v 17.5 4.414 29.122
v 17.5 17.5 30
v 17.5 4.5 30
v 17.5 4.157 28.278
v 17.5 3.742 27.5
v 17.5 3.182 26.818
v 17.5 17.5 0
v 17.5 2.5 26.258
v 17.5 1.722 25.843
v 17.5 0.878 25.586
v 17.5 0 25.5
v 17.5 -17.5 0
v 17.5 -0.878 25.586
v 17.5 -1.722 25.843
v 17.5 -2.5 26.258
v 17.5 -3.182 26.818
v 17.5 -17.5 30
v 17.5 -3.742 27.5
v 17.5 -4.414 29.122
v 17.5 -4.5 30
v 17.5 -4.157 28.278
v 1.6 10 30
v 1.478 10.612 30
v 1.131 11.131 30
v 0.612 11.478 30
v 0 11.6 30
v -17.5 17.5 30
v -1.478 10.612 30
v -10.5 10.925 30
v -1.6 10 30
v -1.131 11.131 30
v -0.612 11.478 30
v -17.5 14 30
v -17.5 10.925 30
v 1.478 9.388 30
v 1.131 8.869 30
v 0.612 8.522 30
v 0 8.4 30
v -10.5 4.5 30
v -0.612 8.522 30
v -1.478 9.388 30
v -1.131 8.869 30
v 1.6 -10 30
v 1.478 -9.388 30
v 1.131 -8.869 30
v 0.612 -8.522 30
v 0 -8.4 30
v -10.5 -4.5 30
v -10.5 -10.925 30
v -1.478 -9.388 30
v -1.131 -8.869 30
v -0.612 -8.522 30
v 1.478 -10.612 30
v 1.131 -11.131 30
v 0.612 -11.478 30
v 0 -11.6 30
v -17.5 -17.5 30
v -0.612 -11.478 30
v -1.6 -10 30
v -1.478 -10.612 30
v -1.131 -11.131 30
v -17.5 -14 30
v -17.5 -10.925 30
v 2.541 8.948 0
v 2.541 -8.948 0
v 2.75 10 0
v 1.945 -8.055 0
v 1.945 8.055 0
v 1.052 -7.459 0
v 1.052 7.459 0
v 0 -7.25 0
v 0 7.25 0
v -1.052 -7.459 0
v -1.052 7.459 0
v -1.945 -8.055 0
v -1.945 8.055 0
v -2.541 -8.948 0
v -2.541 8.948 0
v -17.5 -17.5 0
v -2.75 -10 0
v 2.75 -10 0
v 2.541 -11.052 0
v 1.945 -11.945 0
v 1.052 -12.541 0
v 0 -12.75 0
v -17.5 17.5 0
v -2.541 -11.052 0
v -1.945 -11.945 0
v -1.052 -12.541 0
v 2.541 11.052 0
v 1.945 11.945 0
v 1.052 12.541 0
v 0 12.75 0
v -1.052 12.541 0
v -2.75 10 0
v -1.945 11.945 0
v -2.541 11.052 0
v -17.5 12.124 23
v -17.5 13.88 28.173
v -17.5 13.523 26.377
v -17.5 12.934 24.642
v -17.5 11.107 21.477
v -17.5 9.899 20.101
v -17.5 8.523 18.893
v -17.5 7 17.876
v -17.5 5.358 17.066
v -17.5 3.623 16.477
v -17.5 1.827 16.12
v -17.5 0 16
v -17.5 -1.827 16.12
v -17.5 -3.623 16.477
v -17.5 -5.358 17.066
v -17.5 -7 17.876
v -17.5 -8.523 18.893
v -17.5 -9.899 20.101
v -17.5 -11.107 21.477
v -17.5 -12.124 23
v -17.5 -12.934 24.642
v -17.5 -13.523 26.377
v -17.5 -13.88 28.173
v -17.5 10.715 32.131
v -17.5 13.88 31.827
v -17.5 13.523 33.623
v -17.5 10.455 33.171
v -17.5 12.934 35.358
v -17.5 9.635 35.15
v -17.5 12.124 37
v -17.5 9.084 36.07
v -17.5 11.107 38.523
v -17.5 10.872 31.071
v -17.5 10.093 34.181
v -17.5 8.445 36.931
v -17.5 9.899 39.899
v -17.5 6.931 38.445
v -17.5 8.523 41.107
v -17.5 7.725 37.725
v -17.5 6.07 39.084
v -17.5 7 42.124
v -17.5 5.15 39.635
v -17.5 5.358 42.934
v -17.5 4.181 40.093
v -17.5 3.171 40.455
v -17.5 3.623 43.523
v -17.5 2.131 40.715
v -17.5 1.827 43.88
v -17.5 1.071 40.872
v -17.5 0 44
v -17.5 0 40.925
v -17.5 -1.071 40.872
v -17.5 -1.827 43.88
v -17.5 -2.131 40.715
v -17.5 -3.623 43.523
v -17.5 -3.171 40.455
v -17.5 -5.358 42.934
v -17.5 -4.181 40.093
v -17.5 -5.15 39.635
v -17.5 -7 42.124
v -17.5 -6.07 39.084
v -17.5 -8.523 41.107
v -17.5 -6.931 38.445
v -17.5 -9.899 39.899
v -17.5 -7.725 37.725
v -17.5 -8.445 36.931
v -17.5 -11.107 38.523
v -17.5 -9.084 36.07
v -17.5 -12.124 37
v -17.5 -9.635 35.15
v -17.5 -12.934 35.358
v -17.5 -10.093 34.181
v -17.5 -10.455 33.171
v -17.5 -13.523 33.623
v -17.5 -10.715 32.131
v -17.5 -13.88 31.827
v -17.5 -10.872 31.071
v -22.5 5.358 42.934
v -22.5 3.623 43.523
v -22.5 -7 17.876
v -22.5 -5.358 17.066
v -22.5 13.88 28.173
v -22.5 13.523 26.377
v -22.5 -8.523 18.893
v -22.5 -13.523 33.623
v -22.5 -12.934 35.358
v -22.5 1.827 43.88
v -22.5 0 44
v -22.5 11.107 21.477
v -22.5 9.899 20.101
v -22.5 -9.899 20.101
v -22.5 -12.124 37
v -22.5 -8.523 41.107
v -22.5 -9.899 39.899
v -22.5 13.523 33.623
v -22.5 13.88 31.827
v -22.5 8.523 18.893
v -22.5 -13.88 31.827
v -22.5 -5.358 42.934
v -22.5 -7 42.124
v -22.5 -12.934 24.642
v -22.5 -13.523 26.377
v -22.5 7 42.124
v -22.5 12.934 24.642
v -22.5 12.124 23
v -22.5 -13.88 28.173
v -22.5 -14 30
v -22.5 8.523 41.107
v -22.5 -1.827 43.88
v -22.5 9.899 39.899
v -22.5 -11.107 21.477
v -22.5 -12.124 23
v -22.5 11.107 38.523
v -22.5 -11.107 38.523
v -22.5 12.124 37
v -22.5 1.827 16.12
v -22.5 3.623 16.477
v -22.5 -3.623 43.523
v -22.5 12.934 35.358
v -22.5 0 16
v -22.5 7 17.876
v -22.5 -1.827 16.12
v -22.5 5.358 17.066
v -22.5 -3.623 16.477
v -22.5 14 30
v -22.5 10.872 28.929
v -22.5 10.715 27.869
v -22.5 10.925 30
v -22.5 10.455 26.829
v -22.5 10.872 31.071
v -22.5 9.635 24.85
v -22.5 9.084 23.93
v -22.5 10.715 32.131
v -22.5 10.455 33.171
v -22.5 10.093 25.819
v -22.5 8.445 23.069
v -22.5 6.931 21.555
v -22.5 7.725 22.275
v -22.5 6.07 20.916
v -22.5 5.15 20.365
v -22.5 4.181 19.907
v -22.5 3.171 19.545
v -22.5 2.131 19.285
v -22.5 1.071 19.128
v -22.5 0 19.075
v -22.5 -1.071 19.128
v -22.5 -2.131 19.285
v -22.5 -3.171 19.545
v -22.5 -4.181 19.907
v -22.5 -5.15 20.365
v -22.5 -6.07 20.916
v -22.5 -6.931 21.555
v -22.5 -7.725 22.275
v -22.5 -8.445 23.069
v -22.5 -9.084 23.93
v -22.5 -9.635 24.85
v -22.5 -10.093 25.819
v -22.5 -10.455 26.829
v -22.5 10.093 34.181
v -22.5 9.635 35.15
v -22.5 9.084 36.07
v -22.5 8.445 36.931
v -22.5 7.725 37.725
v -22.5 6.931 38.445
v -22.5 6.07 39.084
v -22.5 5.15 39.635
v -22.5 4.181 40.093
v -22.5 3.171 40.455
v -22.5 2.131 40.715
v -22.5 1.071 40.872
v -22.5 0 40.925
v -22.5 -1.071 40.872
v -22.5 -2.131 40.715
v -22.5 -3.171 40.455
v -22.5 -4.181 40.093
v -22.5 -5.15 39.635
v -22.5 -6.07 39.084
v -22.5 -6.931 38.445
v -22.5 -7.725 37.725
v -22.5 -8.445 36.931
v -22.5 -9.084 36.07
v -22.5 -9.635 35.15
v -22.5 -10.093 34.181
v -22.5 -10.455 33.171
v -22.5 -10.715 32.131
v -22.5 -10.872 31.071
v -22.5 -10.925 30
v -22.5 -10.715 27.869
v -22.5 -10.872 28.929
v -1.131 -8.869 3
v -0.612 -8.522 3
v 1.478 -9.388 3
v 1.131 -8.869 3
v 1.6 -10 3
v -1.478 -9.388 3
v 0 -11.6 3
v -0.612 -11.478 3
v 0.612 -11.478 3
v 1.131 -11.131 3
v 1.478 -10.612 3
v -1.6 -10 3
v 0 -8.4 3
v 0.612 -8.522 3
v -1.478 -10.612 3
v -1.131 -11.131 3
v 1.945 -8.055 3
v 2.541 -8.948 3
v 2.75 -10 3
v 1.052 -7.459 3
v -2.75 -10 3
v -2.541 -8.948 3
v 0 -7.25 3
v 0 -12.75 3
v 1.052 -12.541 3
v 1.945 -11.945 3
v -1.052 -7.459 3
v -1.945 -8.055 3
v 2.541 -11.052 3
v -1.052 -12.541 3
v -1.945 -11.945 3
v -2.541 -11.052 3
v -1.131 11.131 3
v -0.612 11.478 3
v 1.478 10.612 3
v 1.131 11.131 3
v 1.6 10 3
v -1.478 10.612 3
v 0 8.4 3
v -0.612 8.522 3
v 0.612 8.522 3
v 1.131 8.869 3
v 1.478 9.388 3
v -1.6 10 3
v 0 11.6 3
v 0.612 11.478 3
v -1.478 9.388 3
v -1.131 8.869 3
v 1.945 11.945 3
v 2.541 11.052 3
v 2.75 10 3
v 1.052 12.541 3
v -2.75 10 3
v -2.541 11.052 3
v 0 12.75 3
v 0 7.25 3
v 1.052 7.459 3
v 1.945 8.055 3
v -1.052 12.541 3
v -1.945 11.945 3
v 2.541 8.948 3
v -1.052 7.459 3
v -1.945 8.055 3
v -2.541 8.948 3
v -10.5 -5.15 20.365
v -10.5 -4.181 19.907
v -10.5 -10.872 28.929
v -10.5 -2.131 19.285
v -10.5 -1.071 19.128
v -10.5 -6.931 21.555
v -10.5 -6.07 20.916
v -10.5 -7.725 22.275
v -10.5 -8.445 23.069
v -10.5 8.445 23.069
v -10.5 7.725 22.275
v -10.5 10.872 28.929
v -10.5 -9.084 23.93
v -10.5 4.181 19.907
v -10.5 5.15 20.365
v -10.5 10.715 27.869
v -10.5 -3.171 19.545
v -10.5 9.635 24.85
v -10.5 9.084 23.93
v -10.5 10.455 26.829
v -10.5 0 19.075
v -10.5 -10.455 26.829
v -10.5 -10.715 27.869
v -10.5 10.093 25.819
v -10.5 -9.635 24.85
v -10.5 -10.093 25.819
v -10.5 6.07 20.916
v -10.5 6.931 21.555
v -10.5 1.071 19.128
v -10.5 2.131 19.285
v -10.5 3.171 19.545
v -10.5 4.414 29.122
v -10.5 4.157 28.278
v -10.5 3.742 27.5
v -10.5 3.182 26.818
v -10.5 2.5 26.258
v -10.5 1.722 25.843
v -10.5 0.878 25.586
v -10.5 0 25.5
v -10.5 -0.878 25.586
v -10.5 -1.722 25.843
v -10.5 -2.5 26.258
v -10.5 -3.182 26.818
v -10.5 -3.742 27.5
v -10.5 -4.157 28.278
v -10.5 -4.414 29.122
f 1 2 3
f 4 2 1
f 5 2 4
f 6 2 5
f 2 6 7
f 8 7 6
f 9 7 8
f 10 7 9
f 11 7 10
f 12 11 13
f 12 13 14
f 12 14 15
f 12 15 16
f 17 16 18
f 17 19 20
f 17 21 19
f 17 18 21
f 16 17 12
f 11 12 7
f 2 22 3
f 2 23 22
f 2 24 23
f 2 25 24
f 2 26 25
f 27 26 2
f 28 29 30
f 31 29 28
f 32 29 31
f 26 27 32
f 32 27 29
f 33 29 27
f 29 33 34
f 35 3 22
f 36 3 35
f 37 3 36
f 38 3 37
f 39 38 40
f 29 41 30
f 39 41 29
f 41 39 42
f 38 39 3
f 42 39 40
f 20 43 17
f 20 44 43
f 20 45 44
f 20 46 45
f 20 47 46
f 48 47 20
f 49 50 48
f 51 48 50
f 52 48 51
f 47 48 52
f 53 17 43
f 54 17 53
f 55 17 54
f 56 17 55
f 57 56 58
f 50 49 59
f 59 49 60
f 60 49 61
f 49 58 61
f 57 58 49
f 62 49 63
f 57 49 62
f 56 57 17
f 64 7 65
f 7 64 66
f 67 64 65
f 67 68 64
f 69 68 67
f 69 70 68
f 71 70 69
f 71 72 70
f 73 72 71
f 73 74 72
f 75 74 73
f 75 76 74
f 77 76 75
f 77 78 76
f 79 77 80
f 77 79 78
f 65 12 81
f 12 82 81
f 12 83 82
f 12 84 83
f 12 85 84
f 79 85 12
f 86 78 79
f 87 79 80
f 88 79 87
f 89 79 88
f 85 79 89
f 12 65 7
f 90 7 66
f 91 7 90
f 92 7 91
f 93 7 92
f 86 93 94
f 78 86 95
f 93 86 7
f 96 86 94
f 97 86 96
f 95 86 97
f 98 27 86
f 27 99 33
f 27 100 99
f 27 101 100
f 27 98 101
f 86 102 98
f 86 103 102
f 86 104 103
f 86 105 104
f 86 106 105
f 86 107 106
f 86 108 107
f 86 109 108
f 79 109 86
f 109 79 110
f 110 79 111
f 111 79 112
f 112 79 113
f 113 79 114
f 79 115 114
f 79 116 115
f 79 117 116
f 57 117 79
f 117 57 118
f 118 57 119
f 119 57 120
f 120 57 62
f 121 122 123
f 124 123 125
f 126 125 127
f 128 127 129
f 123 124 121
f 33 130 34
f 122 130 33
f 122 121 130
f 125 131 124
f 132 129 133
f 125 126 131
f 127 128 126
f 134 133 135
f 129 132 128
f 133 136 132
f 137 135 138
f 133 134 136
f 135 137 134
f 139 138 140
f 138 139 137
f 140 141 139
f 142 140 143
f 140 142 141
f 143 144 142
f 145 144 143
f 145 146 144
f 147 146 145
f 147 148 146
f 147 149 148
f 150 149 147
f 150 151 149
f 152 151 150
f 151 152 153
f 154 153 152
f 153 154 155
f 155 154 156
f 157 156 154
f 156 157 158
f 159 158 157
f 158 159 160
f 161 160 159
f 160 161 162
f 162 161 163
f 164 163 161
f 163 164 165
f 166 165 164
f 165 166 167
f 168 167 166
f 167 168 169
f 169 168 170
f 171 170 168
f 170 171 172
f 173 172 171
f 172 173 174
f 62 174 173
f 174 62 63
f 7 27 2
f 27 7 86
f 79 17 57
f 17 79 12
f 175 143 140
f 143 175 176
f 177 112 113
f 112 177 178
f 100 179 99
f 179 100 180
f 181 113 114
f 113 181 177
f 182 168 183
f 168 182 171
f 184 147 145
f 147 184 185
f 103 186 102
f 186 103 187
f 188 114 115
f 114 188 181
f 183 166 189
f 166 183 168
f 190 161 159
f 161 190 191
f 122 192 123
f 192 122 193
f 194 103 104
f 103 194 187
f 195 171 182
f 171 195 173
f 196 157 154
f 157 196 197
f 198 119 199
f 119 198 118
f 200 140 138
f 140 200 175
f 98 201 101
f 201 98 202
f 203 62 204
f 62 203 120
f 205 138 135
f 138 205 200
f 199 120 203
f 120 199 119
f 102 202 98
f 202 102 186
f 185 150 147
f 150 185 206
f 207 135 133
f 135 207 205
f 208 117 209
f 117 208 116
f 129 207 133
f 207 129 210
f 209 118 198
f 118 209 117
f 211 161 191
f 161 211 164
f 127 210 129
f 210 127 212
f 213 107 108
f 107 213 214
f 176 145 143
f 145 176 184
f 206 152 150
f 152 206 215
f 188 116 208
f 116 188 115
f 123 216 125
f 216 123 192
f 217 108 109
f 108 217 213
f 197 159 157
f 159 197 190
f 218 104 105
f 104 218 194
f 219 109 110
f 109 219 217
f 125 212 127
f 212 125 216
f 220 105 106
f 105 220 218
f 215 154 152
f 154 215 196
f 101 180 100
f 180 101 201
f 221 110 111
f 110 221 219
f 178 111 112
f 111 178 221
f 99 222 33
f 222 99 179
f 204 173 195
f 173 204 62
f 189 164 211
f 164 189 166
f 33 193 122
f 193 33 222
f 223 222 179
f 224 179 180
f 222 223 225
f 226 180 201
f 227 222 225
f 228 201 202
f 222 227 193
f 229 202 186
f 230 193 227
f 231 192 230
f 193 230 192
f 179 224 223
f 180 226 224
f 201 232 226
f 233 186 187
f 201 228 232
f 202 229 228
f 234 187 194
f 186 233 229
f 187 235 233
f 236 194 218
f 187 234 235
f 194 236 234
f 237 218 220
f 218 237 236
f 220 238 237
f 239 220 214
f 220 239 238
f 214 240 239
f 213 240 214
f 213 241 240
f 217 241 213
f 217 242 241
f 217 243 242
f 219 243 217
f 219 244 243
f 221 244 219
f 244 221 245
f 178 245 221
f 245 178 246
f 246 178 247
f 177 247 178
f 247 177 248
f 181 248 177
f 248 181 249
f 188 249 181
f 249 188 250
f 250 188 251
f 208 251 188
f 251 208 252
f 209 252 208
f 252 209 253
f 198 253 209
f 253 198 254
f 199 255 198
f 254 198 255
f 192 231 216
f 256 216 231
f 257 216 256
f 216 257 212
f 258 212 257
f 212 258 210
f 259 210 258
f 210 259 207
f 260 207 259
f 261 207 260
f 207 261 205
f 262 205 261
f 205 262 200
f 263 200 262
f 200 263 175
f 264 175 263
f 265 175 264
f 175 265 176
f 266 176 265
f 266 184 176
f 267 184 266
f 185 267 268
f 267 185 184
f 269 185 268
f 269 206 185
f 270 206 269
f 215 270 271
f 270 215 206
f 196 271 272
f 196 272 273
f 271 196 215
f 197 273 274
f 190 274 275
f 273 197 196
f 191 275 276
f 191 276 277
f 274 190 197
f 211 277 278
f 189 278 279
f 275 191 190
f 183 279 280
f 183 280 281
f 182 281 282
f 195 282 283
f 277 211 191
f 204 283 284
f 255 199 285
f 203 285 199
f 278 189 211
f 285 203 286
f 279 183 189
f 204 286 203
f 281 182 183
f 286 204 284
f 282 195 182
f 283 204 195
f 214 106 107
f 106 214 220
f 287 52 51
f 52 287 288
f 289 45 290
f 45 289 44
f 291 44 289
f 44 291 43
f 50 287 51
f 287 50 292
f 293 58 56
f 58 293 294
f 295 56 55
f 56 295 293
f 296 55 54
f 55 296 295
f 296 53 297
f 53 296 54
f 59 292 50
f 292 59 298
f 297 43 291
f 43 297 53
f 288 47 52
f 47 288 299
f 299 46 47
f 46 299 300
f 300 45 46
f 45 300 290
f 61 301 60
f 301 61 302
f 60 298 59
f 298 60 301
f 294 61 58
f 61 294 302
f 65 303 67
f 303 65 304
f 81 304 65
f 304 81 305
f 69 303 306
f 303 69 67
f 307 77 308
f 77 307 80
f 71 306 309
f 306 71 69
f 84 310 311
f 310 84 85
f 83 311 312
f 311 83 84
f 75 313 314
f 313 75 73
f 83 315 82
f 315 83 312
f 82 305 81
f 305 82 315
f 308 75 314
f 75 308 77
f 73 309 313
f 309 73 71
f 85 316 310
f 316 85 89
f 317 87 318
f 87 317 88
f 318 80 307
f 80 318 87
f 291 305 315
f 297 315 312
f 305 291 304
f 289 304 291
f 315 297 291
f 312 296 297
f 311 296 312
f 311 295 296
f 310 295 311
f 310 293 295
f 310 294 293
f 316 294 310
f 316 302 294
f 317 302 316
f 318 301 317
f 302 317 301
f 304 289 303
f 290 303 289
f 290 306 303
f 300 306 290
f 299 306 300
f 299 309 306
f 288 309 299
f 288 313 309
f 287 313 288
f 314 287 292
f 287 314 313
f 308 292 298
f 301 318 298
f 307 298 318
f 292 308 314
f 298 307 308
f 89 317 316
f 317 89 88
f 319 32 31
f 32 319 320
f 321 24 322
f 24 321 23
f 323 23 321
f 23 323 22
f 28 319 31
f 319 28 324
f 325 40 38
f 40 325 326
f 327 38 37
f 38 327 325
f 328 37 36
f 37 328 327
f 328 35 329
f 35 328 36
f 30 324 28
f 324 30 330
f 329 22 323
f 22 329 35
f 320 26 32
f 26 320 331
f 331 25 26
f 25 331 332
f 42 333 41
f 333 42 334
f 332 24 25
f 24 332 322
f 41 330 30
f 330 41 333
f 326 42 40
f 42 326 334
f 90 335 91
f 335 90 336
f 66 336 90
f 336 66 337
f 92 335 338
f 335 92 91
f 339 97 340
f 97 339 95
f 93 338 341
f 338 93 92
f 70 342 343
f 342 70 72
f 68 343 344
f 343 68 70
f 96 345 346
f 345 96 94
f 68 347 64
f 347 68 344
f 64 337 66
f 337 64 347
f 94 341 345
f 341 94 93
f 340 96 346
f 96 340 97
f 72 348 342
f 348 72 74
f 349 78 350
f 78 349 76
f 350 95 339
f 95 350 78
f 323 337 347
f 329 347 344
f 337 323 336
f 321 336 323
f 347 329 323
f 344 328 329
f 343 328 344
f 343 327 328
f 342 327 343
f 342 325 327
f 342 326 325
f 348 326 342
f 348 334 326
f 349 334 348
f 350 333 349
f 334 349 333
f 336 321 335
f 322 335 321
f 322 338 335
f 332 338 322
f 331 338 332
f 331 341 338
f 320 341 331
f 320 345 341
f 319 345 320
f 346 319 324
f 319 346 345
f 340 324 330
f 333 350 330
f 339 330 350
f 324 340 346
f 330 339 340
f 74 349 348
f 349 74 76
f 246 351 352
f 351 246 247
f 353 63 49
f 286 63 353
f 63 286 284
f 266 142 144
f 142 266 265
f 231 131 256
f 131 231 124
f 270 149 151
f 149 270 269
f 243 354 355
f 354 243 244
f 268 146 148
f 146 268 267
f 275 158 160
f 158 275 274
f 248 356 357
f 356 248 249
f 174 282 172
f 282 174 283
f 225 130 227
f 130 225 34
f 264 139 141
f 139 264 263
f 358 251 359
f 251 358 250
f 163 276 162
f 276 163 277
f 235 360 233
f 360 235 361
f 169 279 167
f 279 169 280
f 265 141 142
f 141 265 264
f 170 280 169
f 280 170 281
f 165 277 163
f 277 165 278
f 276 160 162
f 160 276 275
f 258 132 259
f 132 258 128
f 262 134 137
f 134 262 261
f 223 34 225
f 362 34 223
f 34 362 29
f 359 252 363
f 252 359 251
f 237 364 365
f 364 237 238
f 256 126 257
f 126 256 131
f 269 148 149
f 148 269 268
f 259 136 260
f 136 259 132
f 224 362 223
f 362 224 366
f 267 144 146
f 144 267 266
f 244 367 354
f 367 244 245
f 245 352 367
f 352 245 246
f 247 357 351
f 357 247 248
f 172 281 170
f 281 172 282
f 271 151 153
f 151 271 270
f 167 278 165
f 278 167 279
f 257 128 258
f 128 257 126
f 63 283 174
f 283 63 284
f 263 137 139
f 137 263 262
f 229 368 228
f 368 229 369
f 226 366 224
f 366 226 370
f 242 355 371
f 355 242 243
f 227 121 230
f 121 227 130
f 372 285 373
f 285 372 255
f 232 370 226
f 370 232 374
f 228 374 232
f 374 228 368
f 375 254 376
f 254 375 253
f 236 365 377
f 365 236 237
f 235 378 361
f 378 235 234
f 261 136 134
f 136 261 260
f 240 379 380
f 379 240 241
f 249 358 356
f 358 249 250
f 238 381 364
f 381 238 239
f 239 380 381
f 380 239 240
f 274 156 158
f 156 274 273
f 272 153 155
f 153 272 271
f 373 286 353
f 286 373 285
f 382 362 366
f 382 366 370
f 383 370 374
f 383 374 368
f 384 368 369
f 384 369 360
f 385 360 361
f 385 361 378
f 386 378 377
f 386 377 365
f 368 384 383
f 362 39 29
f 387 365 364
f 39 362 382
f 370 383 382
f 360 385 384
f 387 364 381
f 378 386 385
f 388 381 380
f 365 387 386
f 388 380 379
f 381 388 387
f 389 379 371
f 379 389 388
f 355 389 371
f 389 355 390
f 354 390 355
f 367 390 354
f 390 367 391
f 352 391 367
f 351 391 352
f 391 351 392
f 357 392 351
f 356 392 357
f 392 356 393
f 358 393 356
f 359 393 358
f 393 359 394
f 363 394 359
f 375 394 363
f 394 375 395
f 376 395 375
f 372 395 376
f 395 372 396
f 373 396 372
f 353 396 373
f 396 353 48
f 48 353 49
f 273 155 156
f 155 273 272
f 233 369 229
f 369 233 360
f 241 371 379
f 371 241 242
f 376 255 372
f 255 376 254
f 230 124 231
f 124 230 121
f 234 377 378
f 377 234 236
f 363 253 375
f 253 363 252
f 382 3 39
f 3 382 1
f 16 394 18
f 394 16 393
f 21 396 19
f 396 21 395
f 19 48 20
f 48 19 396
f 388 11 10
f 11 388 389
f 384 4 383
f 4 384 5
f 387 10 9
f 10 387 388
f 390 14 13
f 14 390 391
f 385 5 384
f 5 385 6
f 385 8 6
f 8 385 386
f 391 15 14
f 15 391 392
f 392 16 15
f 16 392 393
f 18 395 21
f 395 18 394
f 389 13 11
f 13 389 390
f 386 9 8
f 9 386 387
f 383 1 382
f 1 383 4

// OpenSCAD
// file: ../common.scad
/*
 * WAVE OCEAN V10 - COMMON PARAMETERS
 *
 * Shared constants, tolerances, and hardware specifications
 * All dimensions in mm
 *
 * MECHANISM: Helical groove cam drives 24 slats via follower arms
 * - Worm rotates around X axis
 * - Groove follows helix at radius GROOVE_RADIUS
 * - Follower rollers ride in groove, push slats up/down
 * - Phase difference along X creates traveling wave illusion
 */

// ============================================
// PRINT TOLERANCES (tune for your printer)
// ============================================

TOL_CLEARANCE = 0.2;         // Shaft in hole clearance
TOL_PRESS_FIT = -0.15;       // Bearing press-fit interference
TOL_SLIDING = 0.4;           // Sliding fit (guide slots)
TOL_SCREW_HOLE = 0.2;        // Screw hole clearance

// ============================================
// HARDWARE - BEARINGS
// ============================================

// 608 bearing (worm shaft)
BEARING_608_ID = 8;
BEARING_608_OD = 22;
BEARING_608_H = 7;

// 624 bearing (follower rollers)
BEARING_624_ID = 4;
BEARING_624_OD = 13;
BEARING_624_H = 5;

// ============================================
// HARDWARE - FASTENERS
// ============================================

M3_HOLE_DIA = 3 + TOL_SCREW_HOLE;      // 3.2mm
M3_HEAD_DIA = 5.5;
M3_HEAD_H = 3;
M3_NUT_FLAT = 5.5;
M3_NUT_H = 2.4;
M3_INSERT_DIA = 4.0;                    // Heat-set insert hole
M3_INSERT_DEPTH = 5;

// ============================================
// HARDWARE - SHAFTS AND PINS
// ============================================

WORM_SHAFT_DIA = 8;
WORM_SHAFT_LENGTH = 280;               // Extends beyond worm for bearings

ROLLER_AXLE_DIA = 4;
ROLLER_AXLE_LENGTH = 12;

PIVOT_PIN_DIA = 3;
PIVOT_PIN_LENGTH = 15;

// ============================================
// WORM CAM DIMENSIONS
// ============================================

WORM_LENGTH = 200;
WORM_OUTER_RADIUS = 20;              // 40mm diameter (bigger for deeper groove)
WORM_CORE_RADIUS = 10;               // 20mm diameter core
WORM_SHAFT_HOLE = WORM_SHAFT_DIA + TOL_CLEARANCE;  // 8.2mm

// Groove sized to contain 624 bearing roller
GROOVE_WIDTH = BEARING_624_H + 2;    // 7mm wide (bearing + clearance)
GROOVE_DEPTH = BEARING_624_OD/2 + 3; // 9.5mm deep (half bearing + margin)
GROOVE_RADIUS = WORM_OUTER_RADIUS - GROOVE_DEPTH/2;  // ~15mm from center

HELIX_PITCH = 25;                    // 25mm per rotation = 8 turns over 200mm

// ============================================
// SLAT DIMENSIONS
// ============================================

NUM_SLATS = 24;
SLAT_SPACING = WORM_LENGTH / NUM_SLATS;  // 8.33mm

SLAT_WIDTH = 5;                       // X dimension (slightly wider)
SLAT_DEPTH = 30;                      // Y dimension (narrower)
SLAT_HEIGHT = 40;                     // Z dimension

// Wave motion amplitude (half of total travel)
WAVE_AMPLITUDE = 10;                  // ±10mm vertical motion

// ============================================
// FOLLOWER ARM DIMENSIONS
// ============================================

ARM_LENGTH = 35;                      // Pivot to roller center (LONGER)
ARM_WIDTH = 8;
ARM_THICKNESS = 6;

PIVOT_HOLE = PIVOT_PIN_DIA + TOL_CLEARANCE;    // 3.2mm
ROLLER_AXLE_HOLE = ROLLER_AXLE_DIA + TOL_CLEARANCE;  // 4.2mm

// ============================================
// SLAT BRACKET DIMENSIONS
// ============================================

BRACKET_WIDTH = 12;
BRACKET_DEPTH = 20;
BRACKET_HEIGHT = 25;

// ============================================
// GUIDE RAIL DIMENSIONS
// ============================================

GUIDE_LENGTH = 210;
GUIDE_HEIGHT = 30;                    // Taller for more travel
GUIDE_DEPTH = 10;
GUIDE_WALL = 3;

SLOT_WIDTH = SLAT_WIDTH + TOL_SLIDING;   // Slat slides in slot, not bracket tab
SLOT_HEIGHT = WAVE_AMPLITUDE * 2 + 10;   // Allow full travel + margin

// ============================================
// BEARING BLOCK DIMENSIONS
// ============================================

BEARING_BLOCK_WIDTH = 35;
BEARING_BLOCK_DEPTH = 35;
BEARING_BLOCK_HEIGHT = 30;

BEARING_POCKET_DIA = BEARING_608_OD + TOL_PRESS_FIT;  // 21.85mm
BEARING_POCKET_DEPTH = BEARING_608_H + 1;             // 8mm

// ============================================
// BASE PLATE DIMENSIONS
// ============================================

BASE_LENGTH = 280;                    // Longer to fit everything
BASE_WIDTH = 100;                     // Wider for stability
BASE_THICKNESS = 5;

// ============================================
// MOTOR MOUNT DIMENSIONS
// ============================================

N20_BODY_DIA = 12;
N20_BODY_LENGTH = 15;
N20_GEARBOX_DIA = 10;
N20_GEARBOX_LENGTH = 12;
N20_SHAFT_DIA = 3;
N20_SHAFT_LENGTH = 10;

// ============================================
// ASSEMBLY POSITIONS
// ============================================

// Worm center position
// Shaft runs along X axis at this Z height
WORM_CENTER_Z = BASE_THICKNESS + BEARING_BLOCK_HEIGHT;  // 35mm

// Guide rail positions (front and back of slats)
// Slats are centered at Y=0, spanning ±SLAT_DEPTH/2
GUIDE_FRONT_Y = -SLAT_DEPTH/2 - GUIDE_DEPTH/2;   // -20
GUIDE_BACK_Y = SLAT_DEPTH/2 + GUIDE_DEPTH/2;     // +20

// Guide rail Z - slats hang down from here
// Positioned so slat bottom can reach groove at top of worm
GUIDE_Z = WORM_CENTER_Z + WORM_OUTER_RADIUS + SLAT_HEIGHT/2 + 5;  // 80mm

// Bearing block X positions (at ends of worm, inward facing)
BEARING_L_X = -WORM_LENGTH/2 - BEARING_BLOCK_WIDTH/2;   // -117.5
BEARING_R_X = WORM_LENGTH/2 + BEARING_BLOCK_WIDTH/2;    // +117.5

// Motor mount X position (beyond right bearing block)
MOTOR_MOUNT_X = BEARING_R_X + BEARING_BLOCK_WIDTH/2 + 30;

// ============================================
// COLORS (for assembly visualization)
// ============================================

C_WORM = [0.75, 0.55, 0.2];
C_SLAT = [0.2, 0.45, 0.75];
C_BRACKET = [0.4, 0.4, 0.45];
C_ARM = [0.5, 0.5, 0.55];
C_GUIDE = [0.35, 0.35, 0.4];
C_BEARING_BLOCK = [0.3, 0.35, 0.4];
C_BASE = [0.25, 0.25, 0.3];
C_SHAFT = [0.6, 0.6, 0.65];
C_BEARING = [0.7, 0.7, 0.75];
C_MOTOR = [0.3, 0.3, 0.35];

// ============================================
// HELPER FUNCTIONS
// ============================================

// Helix angle at position X along worm (in degrees)
function helix_angle(x) = (x / HELIX_PITCH) * 360;

// Combined phase: helix position + shaft rotation
function phase(x, theta) = helix_angle(x) + theta;

// Groove center position in Y-Z plane (polar coordinates from shaft)
// Y = radius * sin(angle), Z = center + radius * cos(angle)
function groove_y(x, theta) = GROOVE_RADIUS * sin(phase(x, theta));
function groove_z(x, theta) = WORM_CENTER_Z + GROOVE_RADIUS * cos(phase(x, theta));

// Slat X position (evenly spaced along worm length)
function slat_x(i) = i * SLAT_SPACING - WORM_LENGTH/2 + SLAT_SPACING/2;

// Slat Z position - follows groove Z position via follower arm
// When groove is at top (cos=1), slat is pushed up
// When groove is at bottom (cos=-1), slat drops down
function slat_z(i, theta) =
    let(x = slat_x(i))
    GUIDE_Z + GROOVE_RADIUS * cos(phase(x, theta)) - GROOVE_RADIUS;

// ============================================
// CLEARANCE VERIFICATION
// ============================================

// Slat gap: SLAT_SPACING - SLAT_WIDTH = 8.33 - 5 = 3.33mm ✓
// Arm reach: ARM_LENGTH = 35mm, needs to reach ~30mm ✓
// Groove depth: 9.5mm, bearing radius 6.5mm ✓
// Wave travel: ±GROOVE_RADIUS * cos variation = ±15mm

// ============================================
// QUALITY SETTINGS
// ============================================

$fn = 48;  // Default facets
// main file
/*
 * BEARING BLOCK RIGHT - Right Side Bearing Mount
 *
 * Printable part: 1x
 * Print orientation: Base down
 *
 * Features:
 * - 608 bearing pocket (press fit) - HORIZONTAL orientation
 * - Shaft passes through along X axis
 * - Base mounting holes
 * - Mirror of left block (bearing faces -X toward worm)
 */

include <../common.scad>

$fn = 48;

// ============================================
// MAIN BEARING BLOCK MODULE
// ============================================

module bearing_block_R() {
    difference() {
        // Main body
        block_body();

        // Bearing pocket (horizontal, facing -X toward worm)
        bearing_pocket();

        // Shaft through hole (along X axis)
        shaft_hole();

        // Mounting holes
        mounting_holes();
    }
}

// ============================================
// BLOCK BODY
// ============================================

module block_body() {
    // Main block
    translate([-BEARING_BLOCK_WIDTH/2, -BEARING_BLOCK_DEPTH/2, 0])
        cube([BEARING_BLOCK_WIDTH, BEARING_BLOCK_DEPTH, BEARING_BLOCK_HEIGHT]);

    // Bearing boss (extends toward worm, -X direction)
    translate([-BEARING_BLOCK_WIDTH/2, 0, BEARING_BLOCK_HEIGHT])
    rotate([0, -90, 0])
        cylinder(d=BEARING_608_OD + 6, h=5);
}

// ============================================
// BEARING POCKET
// ============================================

module bearing_pocket() {
    // Pocket for 608 bearing - horizontal, facing -X
    translate([-BEARING_BLOCK_WIDTH/2 + BEARING_POCKET_DEPTH - 1, 0, BEARING_BLOCK_HEIGHT])
    rotate([0, -90, 0])
        cylinder(d=BEARING_POCKET_DIA, h=BEARING_POCKET_DEPTH + 5, $fn=64);
}

// ============================================
// SHAFT HOLE
// ============================================

module shaft_hole() {
    // Through hole for shaft along X axis
    shaft_clearance = WORM_SHAFT_DIA + 1;

    translate([-BEARING_BLOCK_WIDTH/2 - 1, 0, BEARING_BLOCK_HEIGHT])
    rotate([0, 90, 0])
        cylinder(d=shaft_clearance, h=BEARING_BLOCK_WIDTH + 10, $fn=32);
}

// ============================================
// MOUNTING HOLES
// ============================================

module mounting_holes() {
    // 2x M3 holes for base attachment
    hole_spacing = 20;

    for (y = [-hole_spacing/2, hole_spacing/2]) {
        translate([0, y, -1]) {
            // Through hole
            cylinder(d=M3_HOLE_DIA, h=BEARING_BLOCK_HEIGHT + 2, $fn=16);

            // Countersink at bottom
            cylinder(d=M3_HEAD_DIA, h=M3_HEAD_H + 1, $fn=16);
        }
    }
}

// ============================================
// RENDER
// ============================================

color(C_BEARING_BLOCK)
bearing_block_R();

// Visualization: 608 bearing in horizontal position
%translate([-BEARING_BLOCK_WIDTH/2 + BEARING_608_H/2, 0, BEARING_BLOCK_HEIGHT])
rotate([0, 90, 0])
    difference() {
        cylinder(d=BEARING_608_OD, h=BEARING_608_H, center=true, $fn=48);
        cylinder(d=BEARING_608_ID, h=BEARING_608_H + 1, center=true, $fn=32);
    }

// ============================================
// INFO
// ============================================

echo("=== BEARING BLOCK RIGHT ===");
echo(str("Block size: ", BEARING_BLOCK_WIDTH, "x", BEARING_BLOCK_DEPTH, "x", BEARING_BLOCK_HEIGHT, "mm"));
echo("Mirror of LEFT block");
echo("Print quantity: 1");
echo("Print orientation: Base down");
